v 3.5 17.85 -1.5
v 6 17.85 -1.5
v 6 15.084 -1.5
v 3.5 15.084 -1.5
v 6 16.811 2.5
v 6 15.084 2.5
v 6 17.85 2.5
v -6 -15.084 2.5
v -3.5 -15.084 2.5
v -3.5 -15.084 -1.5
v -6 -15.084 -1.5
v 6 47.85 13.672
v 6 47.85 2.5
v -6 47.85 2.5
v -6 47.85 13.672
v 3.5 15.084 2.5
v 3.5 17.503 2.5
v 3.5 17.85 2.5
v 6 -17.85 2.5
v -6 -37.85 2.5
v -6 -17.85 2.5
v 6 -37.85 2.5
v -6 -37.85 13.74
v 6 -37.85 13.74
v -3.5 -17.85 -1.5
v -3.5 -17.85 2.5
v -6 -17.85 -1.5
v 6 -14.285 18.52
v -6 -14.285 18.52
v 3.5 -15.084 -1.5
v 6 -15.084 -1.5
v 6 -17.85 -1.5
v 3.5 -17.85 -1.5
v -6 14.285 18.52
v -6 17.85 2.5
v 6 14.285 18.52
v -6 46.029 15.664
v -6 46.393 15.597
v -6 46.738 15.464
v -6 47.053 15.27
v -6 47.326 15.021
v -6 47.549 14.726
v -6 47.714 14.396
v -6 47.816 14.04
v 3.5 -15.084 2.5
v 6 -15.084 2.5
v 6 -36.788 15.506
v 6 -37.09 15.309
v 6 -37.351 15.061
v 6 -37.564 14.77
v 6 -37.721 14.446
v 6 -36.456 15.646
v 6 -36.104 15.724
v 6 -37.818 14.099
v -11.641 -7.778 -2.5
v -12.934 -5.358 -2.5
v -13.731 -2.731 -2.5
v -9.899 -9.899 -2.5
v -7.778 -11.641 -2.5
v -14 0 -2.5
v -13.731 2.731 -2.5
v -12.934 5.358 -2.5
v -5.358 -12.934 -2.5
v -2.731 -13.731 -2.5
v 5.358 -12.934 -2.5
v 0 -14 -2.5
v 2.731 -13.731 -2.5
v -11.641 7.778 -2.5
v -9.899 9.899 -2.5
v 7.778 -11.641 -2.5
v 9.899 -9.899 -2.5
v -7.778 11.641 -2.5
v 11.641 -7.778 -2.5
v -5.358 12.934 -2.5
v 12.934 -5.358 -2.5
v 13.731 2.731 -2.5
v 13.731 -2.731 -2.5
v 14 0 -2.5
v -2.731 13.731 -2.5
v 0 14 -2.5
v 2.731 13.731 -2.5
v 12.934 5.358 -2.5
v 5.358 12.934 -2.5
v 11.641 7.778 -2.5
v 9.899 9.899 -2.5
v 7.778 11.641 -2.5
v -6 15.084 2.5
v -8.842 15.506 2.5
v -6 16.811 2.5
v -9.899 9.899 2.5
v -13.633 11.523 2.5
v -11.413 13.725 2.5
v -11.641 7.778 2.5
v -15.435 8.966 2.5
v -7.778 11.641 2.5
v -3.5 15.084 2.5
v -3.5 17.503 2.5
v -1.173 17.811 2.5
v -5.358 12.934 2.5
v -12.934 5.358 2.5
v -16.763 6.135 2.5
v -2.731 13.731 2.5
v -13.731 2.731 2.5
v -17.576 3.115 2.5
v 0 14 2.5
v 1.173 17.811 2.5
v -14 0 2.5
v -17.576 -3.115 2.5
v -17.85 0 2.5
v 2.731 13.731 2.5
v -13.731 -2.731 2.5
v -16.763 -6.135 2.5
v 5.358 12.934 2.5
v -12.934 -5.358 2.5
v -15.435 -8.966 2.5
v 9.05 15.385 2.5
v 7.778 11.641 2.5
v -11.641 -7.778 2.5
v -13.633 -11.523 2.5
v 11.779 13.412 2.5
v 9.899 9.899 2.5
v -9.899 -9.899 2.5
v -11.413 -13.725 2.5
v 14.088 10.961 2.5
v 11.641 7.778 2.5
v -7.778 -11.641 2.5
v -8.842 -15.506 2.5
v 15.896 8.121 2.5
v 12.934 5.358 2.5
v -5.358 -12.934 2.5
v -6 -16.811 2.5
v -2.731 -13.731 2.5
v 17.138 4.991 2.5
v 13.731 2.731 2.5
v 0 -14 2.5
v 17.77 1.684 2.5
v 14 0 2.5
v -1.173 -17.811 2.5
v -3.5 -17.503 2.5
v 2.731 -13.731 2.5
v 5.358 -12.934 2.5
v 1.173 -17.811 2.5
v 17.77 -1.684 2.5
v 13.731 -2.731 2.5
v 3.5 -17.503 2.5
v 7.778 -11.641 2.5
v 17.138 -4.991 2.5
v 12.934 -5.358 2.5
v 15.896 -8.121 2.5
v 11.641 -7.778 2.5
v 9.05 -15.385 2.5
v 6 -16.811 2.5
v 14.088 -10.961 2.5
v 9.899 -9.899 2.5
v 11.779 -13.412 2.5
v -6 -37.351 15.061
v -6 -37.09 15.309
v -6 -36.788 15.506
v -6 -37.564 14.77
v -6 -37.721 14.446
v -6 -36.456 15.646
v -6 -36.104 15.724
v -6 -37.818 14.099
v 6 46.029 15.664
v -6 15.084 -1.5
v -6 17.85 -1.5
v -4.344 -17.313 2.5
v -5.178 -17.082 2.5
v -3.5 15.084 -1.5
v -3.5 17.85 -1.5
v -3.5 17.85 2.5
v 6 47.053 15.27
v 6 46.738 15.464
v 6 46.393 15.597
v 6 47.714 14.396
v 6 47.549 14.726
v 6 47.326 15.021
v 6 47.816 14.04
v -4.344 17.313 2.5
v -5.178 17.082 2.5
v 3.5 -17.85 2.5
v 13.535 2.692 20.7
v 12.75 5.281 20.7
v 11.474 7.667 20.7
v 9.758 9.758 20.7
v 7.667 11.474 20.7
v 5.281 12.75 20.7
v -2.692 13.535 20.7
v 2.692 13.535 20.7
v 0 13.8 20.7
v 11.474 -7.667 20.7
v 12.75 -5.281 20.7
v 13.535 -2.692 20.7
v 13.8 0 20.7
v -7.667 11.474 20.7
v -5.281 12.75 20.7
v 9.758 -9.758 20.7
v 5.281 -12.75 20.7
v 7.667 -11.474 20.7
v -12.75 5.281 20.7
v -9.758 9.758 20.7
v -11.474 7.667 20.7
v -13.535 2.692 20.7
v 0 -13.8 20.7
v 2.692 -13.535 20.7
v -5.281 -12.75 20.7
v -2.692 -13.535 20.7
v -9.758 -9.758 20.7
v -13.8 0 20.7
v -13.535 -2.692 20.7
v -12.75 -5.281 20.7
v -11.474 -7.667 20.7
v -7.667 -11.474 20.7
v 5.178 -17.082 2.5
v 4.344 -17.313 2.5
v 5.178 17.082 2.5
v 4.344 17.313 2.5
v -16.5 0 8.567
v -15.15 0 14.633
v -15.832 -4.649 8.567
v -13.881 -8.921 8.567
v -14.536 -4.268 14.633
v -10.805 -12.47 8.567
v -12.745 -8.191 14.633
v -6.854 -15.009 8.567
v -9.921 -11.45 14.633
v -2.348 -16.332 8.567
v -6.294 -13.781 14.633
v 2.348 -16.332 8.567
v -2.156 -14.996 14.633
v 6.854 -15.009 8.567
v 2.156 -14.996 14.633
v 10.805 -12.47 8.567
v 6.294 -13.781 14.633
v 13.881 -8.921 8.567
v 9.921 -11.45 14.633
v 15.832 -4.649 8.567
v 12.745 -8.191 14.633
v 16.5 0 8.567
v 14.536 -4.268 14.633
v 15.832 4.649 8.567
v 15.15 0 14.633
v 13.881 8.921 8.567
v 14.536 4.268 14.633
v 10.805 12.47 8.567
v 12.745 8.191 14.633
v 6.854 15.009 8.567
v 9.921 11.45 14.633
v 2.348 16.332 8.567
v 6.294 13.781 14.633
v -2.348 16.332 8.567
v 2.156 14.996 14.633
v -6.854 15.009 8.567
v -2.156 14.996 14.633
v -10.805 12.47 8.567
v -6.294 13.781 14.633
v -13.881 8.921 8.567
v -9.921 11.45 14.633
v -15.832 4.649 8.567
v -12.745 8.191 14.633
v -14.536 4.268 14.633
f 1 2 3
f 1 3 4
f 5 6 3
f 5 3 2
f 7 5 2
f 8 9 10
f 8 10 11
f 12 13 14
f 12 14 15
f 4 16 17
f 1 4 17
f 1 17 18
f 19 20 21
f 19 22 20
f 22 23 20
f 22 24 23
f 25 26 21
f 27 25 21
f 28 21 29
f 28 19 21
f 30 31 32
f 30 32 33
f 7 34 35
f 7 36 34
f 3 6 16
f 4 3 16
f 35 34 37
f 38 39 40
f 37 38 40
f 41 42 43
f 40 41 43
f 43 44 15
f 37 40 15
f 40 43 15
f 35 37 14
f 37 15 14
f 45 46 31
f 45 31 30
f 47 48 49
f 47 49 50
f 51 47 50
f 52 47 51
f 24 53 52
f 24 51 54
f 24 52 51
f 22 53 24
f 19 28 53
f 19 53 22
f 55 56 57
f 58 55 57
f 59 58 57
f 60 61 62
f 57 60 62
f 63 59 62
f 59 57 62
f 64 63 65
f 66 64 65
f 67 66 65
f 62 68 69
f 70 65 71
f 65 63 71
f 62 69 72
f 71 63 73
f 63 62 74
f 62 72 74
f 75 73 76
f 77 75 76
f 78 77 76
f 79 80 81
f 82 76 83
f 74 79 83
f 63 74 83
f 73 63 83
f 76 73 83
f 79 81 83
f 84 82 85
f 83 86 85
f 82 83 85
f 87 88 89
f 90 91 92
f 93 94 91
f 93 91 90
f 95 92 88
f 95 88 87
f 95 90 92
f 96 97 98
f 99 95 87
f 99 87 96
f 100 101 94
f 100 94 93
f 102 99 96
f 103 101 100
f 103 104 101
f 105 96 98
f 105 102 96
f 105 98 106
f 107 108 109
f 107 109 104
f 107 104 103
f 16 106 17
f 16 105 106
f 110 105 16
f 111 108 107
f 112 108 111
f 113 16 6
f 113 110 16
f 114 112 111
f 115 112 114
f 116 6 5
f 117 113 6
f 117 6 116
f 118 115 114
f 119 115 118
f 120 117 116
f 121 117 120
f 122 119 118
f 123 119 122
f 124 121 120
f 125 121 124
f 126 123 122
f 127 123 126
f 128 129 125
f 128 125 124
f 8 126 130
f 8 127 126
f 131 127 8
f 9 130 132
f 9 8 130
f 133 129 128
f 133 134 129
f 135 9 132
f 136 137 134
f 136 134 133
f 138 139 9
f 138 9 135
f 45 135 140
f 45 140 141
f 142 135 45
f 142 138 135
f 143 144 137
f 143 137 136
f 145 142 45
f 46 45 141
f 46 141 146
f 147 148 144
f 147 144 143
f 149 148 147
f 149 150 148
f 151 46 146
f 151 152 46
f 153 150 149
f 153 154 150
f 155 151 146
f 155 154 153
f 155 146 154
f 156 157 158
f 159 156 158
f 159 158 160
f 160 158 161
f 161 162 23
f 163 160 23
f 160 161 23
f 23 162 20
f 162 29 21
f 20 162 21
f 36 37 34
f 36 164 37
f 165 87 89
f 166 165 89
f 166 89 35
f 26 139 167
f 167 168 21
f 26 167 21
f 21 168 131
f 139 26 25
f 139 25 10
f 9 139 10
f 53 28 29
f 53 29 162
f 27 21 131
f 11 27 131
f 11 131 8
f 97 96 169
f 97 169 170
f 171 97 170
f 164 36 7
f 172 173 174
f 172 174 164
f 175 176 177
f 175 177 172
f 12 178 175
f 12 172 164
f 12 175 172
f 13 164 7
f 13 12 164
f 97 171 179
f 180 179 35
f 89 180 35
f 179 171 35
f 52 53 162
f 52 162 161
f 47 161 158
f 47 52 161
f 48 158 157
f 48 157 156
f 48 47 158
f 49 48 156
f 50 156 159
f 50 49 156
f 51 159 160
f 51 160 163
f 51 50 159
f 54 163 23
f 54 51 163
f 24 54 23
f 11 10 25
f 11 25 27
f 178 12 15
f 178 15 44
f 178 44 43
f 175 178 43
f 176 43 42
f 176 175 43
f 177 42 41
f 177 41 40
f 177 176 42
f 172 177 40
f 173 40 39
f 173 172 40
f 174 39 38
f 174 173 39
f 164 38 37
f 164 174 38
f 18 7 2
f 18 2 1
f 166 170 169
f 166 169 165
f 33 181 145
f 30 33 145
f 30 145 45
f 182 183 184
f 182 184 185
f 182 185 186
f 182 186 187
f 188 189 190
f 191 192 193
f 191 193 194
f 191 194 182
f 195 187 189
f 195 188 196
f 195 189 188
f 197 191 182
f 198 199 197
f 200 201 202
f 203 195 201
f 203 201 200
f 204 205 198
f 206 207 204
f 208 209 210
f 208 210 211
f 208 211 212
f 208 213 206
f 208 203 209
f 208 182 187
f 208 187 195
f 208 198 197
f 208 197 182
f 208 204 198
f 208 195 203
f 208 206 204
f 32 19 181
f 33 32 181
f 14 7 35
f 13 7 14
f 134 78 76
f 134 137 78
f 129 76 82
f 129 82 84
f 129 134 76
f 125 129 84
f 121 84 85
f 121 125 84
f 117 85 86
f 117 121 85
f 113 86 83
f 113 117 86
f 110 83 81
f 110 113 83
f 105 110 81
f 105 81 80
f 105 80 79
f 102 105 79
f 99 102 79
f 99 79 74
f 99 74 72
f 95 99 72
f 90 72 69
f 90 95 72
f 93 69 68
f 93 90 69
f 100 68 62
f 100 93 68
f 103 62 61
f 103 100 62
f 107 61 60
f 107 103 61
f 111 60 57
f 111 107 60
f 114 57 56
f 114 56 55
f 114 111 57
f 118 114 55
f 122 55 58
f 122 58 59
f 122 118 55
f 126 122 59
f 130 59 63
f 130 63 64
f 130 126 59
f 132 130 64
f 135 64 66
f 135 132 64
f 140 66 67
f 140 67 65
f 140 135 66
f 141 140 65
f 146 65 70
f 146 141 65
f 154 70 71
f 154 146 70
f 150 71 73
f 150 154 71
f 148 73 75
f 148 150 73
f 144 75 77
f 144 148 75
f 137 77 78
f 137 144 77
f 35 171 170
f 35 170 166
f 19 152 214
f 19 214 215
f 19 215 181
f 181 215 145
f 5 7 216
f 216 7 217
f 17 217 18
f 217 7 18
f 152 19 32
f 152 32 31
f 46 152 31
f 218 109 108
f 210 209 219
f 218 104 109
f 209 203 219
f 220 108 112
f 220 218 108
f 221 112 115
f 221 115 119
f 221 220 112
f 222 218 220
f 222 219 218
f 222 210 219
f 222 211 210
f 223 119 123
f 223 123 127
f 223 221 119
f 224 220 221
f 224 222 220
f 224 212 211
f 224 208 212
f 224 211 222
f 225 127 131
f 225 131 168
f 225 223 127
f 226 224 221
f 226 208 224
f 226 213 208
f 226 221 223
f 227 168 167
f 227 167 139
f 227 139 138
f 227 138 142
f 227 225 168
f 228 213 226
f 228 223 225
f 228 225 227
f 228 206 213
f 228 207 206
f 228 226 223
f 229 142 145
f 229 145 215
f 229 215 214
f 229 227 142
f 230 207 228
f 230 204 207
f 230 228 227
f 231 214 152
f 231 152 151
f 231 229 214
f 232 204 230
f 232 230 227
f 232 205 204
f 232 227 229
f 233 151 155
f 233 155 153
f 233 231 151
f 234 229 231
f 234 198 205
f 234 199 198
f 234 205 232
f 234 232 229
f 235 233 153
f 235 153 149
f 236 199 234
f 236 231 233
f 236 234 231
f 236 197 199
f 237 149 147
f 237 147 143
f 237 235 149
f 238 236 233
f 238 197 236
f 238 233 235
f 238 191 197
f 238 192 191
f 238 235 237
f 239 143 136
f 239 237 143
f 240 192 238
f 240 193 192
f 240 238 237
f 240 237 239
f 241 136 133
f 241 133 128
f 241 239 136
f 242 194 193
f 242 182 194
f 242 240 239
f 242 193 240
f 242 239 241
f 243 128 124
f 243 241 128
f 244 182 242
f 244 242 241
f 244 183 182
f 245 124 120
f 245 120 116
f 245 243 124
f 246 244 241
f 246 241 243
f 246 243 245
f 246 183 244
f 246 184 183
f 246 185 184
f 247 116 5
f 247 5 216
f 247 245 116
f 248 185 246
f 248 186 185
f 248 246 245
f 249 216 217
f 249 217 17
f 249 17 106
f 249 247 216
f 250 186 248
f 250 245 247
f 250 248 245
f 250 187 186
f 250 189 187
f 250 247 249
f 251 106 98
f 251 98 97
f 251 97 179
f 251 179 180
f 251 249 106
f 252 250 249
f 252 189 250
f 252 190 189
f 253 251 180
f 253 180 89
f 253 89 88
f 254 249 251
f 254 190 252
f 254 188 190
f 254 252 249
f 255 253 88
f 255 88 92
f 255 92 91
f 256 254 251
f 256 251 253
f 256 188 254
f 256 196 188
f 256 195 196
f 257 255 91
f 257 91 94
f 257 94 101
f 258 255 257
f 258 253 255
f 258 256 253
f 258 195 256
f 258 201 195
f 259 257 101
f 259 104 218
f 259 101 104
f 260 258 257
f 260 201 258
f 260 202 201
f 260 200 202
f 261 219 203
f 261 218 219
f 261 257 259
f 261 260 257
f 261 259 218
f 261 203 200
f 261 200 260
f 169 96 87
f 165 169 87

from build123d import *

# Parameters (mm, degrees)
CROQUIS1_R                = 14
SALIENTE_EXTRUIR1_DEPTH   = 2.5
SALIENTE_EXTRUIR2_DEPTH   = 6
SALIENTE_EXTRUIR2_2_DEPTH = 6
CROQUIS8_W                = 2.5
CROQUIS8_H                = 2.765808148
SALIENTE_EXTRUIR4_DEPTH   = 4


with BuildPart() as part:
    # Croquis1 → Saliente-Extruir1 (new, symmetric)
    with BuildSketch(Plane.XY):
        Circle(CROQUIS1_R)
    extrude(amount=SALIENTE_EXTRUIR1_DEPTH, both=True)

    # Croquis4 → Revolución1 (revolve)
    with BuildSketch(Plane(origin=(0, 0, 0), x_dir=(1, 0, 0), z_dir=(0, 1, 0)), mode=Mode.PRIVATE) as revoluci_n1_sk:
        Polygon((0, -2.5), (17.85, -2.5), (13.8, -20.7), (0, -20.7), align=None)
    revolve(revoluci_n1_sk.sketch.rotate(Axis((0, 0, 2.5), (0, 0, 1)), 180), axis=Axis((0, 0, 2.5), (0, 0, 1)))

    # Croquis8 → Saliente-Extruir4 (add)
    with BuildSketch(Plane(origin=(0, 0, 2.5), x_dir=(-1, 0, 0), z_dir=(0, 0, -1))):
        with Locations((-4.75, 16.467095926)):
            Rectangle(CROQUIS8_W, CROQUIS8_H)
        with Locations((4.75, 16.467095926)):
            Rectangle(CROQUIS8_W, CROQUIS8_H)
        with Locations((4.75, -16.467095926)):
            Rectangle(CROQUIS8_W, CROQUIS8_H)
        with Locations((-4.75, -16.467095926)):
            Rectangle(CROQUIS8_W, CROQUIS8_H)
    extrude(amount=SALIENTE_EXTRUIR4_DEPTH)


with BuildPart() as body_2:
    # Croquis6 → Saliente-Extruir2 (new, symmetric)
    with BuildSketch(Plane(origin=(0, 0, 0), x_dir=(0, 0, -1), z_dir=(1, 0, 0))):
        with BuildLine():
            Line((-2.5, 17.85), (-2.5, 47.85))
            Line((-2.5, 47.85), (-13.671870764, 47.85))
            ThreePointArc((-13.671870764, 47.85), (-15.021231375, 47.326220154), (-15.663824092, 46.029225942))
            Line((-15.663824092, 46.029225942), (-18.52, 14.28510989))
            Line((-18.52, 14.28510989), (-2.5, 17.85))
        make_face()
    extrude(amount=SALIENTE_EXTRUIR2_DEPTH, both=True)


with BuildPart() as body_3:
    # Croquis6 → Saliente-Extruir2 2 (new, symmetric)
    with BuildSketch(Plane(origin=(0, 0, 0), x_dir=(0, 0, -1), z_dir=(1, 0, 0))):
        with BuildLine():
            Line((-2.5, -17.85), (-18.52, -14.28510989))
            Line((-18.52, -14.28510989), (-15.723731687, -36.104234234))
            ThreePointArc((-15.723731687, -36.104234234), (-15.061230554, -37.351410748), (-13.739956257, -37.85))
            Line((-13.739956257, -37.85), (-2.5, -37.85))
            Line((-2.5, -37.85), (-2.5, -17.85))
        make_face()
    extrude(amount=SALIENTE_EXTRUIR2_2_DEPTH, both=True)


solid = Compound([part.part, body_2.part, body_3.part])
